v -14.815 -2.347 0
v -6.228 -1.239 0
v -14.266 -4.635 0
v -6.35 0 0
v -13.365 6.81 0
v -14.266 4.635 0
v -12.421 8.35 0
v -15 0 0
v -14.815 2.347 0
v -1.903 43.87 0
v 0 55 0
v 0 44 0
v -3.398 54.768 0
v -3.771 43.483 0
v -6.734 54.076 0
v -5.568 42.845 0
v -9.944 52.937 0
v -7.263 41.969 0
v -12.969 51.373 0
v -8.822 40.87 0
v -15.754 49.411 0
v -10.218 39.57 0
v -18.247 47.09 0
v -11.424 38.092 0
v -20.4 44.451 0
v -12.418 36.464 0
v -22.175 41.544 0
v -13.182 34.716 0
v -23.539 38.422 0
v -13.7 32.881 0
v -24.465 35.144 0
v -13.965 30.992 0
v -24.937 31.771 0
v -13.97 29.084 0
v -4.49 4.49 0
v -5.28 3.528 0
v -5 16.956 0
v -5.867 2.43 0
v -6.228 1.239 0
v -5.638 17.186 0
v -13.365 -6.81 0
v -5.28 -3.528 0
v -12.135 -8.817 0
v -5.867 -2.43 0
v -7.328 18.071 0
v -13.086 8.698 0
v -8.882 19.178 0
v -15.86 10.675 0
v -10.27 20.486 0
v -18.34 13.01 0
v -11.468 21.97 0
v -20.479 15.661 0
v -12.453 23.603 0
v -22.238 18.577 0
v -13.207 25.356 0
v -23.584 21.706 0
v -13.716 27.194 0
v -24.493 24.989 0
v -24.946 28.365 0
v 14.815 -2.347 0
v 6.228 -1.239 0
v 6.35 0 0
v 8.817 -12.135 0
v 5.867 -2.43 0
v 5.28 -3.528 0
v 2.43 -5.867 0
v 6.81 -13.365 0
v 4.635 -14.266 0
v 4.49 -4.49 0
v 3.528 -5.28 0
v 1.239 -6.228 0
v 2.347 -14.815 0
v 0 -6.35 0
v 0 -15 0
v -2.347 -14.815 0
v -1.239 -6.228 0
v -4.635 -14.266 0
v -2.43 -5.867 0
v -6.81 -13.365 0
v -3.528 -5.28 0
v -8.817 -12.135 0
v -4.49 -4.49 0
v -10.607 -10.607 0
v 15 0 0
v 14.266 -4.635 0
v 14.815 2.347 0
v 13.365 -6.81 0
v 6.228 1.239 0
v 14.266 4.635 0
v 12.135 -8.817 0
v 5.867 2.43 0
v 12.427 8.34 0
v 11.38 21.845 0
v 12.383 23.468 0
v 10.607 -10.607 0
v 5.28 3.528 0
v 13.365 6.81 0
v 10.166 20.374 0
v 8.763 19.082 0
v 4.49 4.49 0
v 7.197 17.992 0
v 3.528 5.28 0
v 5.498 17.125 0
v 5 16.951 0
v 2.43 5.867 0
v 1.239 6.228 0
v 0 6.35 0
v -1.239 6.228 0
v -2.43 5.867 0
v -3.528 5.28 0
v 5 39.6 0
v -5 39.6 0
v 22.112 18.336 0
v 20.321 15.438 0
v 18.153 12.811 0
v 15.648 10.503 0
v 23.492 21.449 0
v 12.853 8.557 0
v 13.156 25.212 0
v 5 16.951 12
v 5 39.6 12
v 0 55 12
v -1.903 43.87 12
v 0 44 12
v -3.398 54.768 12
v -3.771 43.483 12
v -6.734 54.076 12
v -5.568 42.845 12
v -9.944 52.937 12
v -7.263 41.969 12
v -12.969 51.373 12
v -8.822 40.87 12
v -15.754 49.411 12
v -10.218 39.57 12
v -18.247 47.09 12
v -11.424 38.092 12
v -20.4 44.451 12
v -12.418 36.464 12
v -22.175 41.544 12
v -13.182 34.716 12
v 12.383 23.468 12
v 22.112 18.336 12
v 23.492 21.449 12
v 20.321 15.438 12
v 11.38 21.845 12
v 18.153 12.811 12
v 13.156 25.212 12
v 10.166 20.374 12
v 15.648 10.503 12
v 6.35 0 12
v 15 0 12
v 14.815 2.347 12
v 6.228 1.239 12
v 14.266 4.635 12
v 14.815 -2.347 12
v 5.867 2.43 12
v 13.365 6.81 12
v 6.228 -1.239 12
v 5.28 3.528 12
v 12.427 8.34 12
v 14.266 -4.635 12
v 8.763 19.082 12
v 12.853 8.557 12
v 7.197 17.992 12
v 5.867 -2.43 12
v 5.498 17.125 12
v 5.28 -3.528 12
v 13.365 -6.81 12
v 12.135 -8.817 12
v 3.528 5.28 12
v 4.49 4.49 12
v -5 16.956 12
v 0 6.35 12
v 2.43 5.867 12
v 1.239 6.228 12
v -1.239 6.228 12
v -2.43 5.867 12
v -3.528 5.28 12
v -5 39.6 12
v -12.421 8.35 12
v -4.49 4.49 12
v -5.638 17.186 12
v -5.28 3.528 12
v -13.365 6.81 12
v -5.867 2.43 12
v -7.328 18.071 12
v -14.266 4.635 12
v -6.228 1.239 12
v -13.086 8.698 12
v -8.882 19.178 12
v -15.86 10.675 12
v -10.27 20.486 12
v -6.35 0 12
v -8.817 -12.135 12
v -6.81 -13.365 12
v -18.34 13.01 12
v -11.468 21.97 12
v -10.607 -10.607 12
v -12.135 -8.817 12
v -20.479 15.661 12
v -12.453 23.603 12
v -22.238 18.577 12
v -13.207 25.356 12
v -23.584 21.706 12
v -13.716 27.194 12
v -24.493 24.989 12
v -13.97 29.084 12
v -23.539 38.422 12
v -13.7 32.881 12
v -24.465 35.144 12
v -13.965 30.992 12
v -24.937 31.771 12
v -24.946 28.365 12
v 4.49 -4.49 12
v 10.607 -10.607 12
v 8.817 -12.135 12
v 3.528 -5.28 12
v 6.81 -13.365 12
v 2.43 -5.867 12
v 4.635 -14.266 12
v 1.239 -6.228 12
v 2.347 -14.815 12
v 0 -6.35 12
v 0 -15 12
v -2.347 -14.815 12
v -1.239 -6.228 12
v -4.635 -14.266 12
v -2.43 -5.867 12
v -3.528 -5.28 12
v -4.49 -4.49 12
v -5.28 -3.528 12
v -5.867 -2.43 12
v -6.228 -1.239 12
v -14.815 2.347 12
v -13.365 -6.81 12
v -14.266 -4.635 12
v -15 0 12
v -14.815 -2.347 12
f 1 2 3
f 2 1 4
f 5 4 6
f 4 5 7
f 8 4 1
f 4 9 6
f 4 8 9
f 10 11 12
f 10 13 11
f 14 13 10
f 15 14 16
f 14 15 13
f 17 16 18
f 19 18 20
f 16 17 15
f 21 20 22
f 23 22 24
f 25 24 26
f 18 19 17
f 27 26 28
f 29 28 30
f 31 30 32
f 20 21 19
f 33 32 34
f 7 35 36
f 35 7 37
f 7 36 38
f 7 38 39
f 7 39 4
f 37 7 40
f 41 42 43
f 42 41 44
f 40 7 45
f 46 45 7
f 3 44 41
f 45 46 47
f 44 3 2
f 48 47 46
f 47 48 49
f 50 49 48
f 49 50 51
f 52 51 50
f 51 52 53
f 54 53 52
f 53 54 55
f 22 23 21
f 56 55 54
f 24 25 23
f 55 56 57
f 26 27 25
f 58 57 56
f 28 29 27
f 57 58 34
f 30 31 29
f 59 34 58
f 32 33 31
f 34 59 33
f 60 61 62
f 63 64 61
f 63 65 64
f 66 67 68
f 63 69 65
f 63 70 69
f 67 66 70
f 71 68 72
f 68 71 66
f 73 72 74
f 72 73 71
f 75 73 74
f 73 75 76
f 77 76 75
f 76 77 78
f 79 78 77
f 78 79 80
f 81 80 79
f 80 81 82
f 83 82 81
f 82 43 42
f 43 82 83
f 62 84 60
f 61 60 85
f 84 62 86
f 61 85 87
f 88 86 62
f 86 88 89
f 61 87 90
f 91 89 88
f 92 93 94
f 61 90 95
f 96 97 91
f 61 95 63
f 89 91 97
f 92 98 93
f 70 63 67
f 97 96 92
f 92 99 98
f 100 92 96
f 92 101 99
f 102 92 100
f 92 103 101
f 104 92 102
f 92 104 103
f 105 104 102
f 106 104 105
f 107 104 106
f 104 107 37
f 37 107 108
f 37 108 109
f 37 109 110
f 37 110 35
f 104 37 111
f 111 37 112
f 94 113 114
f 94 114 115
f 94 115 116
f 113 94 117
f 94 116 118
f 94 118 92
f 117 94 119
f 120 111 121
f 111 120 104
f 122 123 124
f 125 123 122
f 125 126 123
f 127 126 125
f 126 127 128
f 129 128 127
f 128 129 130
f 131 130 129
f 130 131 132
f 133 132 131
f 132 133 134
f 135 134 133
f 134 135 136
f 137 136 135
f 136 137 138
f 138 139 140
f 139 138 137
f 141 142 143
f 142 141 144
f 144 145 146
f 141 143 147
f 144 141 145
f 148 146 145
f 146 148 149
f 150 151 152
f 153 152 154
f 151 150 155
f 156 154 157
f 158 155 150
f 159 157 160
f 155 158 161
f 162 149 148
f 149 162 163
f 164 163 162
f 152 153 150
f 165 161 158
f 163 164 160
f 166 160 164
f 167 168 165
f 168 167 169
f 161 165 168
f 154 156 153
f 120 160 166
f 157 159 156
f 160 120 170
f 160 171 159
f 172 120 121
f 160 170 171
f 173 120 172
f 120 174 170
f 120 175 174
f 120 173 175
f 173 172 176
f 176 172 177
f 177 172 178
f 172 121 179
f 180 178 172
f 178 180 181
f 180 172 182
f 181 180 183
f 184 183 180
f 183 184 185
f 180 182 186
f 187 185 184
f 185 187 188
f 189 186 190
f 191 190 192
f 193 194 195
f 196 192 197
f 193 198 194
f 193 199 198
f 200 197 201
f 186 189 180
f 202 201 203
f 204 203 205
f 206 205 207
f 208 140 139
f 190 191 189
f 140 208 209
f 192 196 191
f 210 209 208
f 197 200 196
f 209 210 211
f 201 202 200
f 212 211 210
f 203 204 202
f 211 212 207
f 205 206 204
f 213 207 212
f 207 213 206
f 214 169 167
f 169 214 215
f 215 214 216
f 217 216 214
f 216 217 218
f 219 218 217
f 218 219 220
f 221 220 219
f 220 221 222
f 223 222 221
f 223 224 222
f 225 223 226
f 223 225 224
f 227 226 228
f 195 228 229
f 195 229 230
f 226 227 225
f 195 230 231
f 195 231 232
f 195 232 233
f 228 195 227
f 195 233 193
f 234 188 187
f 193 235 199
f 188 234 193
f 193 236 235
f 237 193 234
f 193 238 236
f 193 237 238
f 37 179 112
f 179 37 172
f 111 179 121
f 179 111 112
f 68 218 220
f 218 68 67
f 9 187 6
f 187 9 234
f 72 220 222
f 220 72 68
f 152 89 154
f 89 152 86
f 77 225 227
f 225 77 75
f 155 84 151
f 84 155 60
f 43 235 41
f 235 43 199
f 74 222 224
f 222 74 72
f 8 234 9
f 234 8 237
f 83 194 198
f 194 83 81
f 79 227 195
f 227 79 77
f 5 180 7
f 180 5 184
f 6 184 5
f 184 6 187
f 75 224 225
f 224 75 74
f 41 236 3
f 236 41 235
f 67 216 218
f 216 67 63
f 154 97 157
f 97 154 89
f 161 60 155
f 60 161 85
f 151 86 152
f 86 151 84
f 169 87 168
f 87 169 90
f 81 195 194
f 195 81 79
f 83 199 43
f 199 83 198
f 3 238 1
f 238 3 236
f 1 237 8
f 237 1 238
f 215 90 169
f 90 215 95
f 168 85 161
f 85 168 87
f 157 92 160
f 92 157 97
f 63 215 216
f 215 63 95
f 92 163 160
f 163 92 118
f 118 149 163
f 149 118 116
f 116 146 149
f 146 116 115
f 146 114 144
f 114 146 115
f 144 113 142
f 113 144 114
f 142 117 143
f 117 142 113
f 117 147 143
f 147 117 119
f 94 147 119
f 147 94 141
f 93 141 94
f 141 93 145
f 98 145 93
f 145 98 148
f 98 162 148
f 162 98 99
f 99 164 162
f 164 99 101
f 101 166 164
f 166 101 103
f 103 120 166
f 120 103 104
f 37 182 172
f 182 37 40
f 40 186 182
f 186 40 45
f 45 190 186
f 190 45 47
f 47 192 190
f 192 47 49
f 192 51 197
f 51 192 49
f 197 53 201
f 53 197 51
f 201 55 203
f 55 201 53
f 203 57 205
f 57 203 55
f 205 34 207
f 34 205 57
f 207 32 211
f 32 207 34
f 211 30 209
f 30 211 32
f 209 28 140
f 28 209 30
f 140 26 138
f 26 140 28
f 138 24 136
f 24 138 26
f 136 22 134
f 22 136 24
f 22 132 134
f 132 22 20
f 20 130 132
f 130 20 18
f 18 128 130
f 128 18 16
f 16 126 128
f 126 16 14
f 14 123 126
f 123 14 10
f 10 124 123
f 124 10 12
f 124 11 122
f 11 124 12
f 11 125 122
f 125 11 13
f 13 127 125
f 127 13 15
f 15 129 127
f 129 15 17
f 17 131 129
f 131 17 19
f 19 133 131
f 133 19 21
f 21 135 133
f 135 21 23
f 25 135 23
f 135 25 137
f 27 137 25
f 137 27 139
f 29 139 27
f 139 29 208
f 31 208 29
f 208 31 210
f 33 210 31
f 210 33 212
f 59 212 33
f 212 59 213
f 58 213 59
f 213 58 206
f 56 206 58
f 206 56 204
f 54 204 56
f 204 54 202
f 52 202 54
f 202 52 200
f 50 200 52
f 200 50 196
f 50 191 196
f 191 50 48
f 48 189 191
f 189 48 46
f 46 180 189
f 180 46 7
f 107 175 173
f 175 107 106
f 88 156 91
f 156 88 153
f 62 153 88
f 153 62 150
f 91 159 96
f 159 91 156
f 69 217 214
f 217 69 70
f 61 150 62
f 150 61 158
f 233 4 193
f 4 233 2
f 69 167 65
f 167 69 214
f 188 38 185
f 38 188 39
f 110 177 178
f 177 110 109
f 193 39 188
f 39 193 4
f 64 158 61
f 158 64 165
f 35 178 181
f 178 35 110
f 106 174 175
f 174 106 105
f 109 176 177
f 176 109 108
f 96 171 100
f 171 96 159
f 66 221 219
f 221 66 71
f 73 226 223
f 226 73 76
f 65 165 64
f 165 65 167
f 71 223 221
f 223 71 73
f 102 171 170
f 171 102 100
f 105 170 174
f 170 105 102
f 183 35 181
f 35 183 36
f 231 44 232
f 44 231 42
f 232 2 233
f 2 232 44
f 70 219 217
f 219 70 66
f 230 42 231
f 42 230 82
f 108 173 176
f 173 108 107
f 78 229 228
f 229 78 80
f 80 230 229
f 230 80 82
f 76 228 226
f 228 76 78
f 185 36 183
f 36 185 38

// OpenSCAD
$fn = 32;

// ----------------------------------------------------------------------
// Hook: 60 mm shank into a 14 mm curl, 12 mm thick
// ----------------------------------------------------------------------

// --- parameters (mm) ---
shank_len = 60;           // shank length from the boss centre
shank_w = 10;             // shank width
boss_d = 30;              // boss diameter
bore_d = 12.7;            // boss bore
curl_in = 14;             // curl inner radius
curl_out = 25;            // curl outer radius
curl_sweep = 250;         // curl sweep angle
hook_t = 12;              // hook thickness

shank_profile = [[-5, 39.6], [5, 39.6], [5, 13], [-5, 13]];
boss_profile = [[15, 0], [14.815, 2.347], [14.266, 4.635], [13.365, 6.81], [12.135, 8.817], [10.607, 10.607], [8.817, 12.135], [6.81, 13.365], [4.635, 14.266], [2.347, 14.815], [0, 15], [-2.347, 14.815], [-4.635, 14.266], [-6.81, 13.365], [-8.817, 12.135], [-10.607, 10.607], [-12.135, 8.817], [-13.365, 6.81], [-14.266, 4.635], [-14.815, 2.347], [-15, 0], [-14.815, -2.347], [-14.266, -4.635], [-13.365, -6.81], [-12.135, -8.817], [-10.607, -10.607], [-8.817, -12.135], [-6.81, -13.365], [-4.635, -14.266], [-2.347, -14.815], [0, -15], [2.347, -14.815], [4.635, -14.266], [6.81, -13.365], [8.817, -12.135], [10.607, -10.607], [12.135, -8.817], [13.365, -6.81], [14.266, -4.635], [14.815, -2.347]];
curl_profile = [[0, 55], [-3.398, 54.768], [-6.734, 54.076], [-9.944, 52.937], [-12.969, 51.373], [-15.754, 49.411], [-18.247, 47.09], [-20.4, 44.451], [-22.175, 41.544], [-23.539, 38.422], [-24.465, 35.144], [-24.937, 31.771], [-24.946, 28.365], [-24.493, 24.989], [-23.584, 21.706], [-22.238, 18.577], [-20.479, 15.661], [-18.34, 13.01], [-15.86, 10.675], [-13.086, 8.698], [-10.069, 7.117], [-6.865, 5.961], [-3.533, 5.251], [-0.136, 5], [3.263, 5.214], [6.602, 5.888], [9.818, 7.009], [12.853, 8.557], [15.648, 10.503], [18.153, 12.811], [20.321, 15.438], [22.112, 18.336], [23.492, 21.449], [13.156, 25.212], [12.383, 23.468], [11.38, 21.845], [10.166, 20.374], [8.763, 19.082], [7.197, 17.992], [5.498, 17.125], [3.697, 16.497], [1.827, 16.12], [-0.076, 16], [-1.979, 16.141], [-3.844, 16.538], [-5.638, 17.186], [-7.328, 18.071], [-8.882, 19.178], [-10.27, 20.486], [-11.468, 21.97], [-12.453, 23.603], [-13.207, 25.356], [-13.716, 27.194], [-13.97, 29.084], [-13.965, 30.992], [-13.7, 32.881], [-13.182, 34.716], [-12.418, 36.464], [-11.424, 38.092], [-10.218, 39.57], [-8.822, 40.87], [-7.263, 41.969], [-5.568, 42.845], [-3.771, 43.483], [-1.903, 43.87], [0, 44]];

difference() {
  union() {
    /* three overlapping outlines: shank, boss and the smooth curl */
    linear_extrude(height = hook_t) polygon(shank_profile);
    linear_extrude(height = hook_t) polygon(boss_profile);
    linear_extrude(height = hook_t) polygon(curl_profile);
  }
  translate([0, 0, -2.5]) cylinder(h = hook_t + 5, d = bore_d);
}
